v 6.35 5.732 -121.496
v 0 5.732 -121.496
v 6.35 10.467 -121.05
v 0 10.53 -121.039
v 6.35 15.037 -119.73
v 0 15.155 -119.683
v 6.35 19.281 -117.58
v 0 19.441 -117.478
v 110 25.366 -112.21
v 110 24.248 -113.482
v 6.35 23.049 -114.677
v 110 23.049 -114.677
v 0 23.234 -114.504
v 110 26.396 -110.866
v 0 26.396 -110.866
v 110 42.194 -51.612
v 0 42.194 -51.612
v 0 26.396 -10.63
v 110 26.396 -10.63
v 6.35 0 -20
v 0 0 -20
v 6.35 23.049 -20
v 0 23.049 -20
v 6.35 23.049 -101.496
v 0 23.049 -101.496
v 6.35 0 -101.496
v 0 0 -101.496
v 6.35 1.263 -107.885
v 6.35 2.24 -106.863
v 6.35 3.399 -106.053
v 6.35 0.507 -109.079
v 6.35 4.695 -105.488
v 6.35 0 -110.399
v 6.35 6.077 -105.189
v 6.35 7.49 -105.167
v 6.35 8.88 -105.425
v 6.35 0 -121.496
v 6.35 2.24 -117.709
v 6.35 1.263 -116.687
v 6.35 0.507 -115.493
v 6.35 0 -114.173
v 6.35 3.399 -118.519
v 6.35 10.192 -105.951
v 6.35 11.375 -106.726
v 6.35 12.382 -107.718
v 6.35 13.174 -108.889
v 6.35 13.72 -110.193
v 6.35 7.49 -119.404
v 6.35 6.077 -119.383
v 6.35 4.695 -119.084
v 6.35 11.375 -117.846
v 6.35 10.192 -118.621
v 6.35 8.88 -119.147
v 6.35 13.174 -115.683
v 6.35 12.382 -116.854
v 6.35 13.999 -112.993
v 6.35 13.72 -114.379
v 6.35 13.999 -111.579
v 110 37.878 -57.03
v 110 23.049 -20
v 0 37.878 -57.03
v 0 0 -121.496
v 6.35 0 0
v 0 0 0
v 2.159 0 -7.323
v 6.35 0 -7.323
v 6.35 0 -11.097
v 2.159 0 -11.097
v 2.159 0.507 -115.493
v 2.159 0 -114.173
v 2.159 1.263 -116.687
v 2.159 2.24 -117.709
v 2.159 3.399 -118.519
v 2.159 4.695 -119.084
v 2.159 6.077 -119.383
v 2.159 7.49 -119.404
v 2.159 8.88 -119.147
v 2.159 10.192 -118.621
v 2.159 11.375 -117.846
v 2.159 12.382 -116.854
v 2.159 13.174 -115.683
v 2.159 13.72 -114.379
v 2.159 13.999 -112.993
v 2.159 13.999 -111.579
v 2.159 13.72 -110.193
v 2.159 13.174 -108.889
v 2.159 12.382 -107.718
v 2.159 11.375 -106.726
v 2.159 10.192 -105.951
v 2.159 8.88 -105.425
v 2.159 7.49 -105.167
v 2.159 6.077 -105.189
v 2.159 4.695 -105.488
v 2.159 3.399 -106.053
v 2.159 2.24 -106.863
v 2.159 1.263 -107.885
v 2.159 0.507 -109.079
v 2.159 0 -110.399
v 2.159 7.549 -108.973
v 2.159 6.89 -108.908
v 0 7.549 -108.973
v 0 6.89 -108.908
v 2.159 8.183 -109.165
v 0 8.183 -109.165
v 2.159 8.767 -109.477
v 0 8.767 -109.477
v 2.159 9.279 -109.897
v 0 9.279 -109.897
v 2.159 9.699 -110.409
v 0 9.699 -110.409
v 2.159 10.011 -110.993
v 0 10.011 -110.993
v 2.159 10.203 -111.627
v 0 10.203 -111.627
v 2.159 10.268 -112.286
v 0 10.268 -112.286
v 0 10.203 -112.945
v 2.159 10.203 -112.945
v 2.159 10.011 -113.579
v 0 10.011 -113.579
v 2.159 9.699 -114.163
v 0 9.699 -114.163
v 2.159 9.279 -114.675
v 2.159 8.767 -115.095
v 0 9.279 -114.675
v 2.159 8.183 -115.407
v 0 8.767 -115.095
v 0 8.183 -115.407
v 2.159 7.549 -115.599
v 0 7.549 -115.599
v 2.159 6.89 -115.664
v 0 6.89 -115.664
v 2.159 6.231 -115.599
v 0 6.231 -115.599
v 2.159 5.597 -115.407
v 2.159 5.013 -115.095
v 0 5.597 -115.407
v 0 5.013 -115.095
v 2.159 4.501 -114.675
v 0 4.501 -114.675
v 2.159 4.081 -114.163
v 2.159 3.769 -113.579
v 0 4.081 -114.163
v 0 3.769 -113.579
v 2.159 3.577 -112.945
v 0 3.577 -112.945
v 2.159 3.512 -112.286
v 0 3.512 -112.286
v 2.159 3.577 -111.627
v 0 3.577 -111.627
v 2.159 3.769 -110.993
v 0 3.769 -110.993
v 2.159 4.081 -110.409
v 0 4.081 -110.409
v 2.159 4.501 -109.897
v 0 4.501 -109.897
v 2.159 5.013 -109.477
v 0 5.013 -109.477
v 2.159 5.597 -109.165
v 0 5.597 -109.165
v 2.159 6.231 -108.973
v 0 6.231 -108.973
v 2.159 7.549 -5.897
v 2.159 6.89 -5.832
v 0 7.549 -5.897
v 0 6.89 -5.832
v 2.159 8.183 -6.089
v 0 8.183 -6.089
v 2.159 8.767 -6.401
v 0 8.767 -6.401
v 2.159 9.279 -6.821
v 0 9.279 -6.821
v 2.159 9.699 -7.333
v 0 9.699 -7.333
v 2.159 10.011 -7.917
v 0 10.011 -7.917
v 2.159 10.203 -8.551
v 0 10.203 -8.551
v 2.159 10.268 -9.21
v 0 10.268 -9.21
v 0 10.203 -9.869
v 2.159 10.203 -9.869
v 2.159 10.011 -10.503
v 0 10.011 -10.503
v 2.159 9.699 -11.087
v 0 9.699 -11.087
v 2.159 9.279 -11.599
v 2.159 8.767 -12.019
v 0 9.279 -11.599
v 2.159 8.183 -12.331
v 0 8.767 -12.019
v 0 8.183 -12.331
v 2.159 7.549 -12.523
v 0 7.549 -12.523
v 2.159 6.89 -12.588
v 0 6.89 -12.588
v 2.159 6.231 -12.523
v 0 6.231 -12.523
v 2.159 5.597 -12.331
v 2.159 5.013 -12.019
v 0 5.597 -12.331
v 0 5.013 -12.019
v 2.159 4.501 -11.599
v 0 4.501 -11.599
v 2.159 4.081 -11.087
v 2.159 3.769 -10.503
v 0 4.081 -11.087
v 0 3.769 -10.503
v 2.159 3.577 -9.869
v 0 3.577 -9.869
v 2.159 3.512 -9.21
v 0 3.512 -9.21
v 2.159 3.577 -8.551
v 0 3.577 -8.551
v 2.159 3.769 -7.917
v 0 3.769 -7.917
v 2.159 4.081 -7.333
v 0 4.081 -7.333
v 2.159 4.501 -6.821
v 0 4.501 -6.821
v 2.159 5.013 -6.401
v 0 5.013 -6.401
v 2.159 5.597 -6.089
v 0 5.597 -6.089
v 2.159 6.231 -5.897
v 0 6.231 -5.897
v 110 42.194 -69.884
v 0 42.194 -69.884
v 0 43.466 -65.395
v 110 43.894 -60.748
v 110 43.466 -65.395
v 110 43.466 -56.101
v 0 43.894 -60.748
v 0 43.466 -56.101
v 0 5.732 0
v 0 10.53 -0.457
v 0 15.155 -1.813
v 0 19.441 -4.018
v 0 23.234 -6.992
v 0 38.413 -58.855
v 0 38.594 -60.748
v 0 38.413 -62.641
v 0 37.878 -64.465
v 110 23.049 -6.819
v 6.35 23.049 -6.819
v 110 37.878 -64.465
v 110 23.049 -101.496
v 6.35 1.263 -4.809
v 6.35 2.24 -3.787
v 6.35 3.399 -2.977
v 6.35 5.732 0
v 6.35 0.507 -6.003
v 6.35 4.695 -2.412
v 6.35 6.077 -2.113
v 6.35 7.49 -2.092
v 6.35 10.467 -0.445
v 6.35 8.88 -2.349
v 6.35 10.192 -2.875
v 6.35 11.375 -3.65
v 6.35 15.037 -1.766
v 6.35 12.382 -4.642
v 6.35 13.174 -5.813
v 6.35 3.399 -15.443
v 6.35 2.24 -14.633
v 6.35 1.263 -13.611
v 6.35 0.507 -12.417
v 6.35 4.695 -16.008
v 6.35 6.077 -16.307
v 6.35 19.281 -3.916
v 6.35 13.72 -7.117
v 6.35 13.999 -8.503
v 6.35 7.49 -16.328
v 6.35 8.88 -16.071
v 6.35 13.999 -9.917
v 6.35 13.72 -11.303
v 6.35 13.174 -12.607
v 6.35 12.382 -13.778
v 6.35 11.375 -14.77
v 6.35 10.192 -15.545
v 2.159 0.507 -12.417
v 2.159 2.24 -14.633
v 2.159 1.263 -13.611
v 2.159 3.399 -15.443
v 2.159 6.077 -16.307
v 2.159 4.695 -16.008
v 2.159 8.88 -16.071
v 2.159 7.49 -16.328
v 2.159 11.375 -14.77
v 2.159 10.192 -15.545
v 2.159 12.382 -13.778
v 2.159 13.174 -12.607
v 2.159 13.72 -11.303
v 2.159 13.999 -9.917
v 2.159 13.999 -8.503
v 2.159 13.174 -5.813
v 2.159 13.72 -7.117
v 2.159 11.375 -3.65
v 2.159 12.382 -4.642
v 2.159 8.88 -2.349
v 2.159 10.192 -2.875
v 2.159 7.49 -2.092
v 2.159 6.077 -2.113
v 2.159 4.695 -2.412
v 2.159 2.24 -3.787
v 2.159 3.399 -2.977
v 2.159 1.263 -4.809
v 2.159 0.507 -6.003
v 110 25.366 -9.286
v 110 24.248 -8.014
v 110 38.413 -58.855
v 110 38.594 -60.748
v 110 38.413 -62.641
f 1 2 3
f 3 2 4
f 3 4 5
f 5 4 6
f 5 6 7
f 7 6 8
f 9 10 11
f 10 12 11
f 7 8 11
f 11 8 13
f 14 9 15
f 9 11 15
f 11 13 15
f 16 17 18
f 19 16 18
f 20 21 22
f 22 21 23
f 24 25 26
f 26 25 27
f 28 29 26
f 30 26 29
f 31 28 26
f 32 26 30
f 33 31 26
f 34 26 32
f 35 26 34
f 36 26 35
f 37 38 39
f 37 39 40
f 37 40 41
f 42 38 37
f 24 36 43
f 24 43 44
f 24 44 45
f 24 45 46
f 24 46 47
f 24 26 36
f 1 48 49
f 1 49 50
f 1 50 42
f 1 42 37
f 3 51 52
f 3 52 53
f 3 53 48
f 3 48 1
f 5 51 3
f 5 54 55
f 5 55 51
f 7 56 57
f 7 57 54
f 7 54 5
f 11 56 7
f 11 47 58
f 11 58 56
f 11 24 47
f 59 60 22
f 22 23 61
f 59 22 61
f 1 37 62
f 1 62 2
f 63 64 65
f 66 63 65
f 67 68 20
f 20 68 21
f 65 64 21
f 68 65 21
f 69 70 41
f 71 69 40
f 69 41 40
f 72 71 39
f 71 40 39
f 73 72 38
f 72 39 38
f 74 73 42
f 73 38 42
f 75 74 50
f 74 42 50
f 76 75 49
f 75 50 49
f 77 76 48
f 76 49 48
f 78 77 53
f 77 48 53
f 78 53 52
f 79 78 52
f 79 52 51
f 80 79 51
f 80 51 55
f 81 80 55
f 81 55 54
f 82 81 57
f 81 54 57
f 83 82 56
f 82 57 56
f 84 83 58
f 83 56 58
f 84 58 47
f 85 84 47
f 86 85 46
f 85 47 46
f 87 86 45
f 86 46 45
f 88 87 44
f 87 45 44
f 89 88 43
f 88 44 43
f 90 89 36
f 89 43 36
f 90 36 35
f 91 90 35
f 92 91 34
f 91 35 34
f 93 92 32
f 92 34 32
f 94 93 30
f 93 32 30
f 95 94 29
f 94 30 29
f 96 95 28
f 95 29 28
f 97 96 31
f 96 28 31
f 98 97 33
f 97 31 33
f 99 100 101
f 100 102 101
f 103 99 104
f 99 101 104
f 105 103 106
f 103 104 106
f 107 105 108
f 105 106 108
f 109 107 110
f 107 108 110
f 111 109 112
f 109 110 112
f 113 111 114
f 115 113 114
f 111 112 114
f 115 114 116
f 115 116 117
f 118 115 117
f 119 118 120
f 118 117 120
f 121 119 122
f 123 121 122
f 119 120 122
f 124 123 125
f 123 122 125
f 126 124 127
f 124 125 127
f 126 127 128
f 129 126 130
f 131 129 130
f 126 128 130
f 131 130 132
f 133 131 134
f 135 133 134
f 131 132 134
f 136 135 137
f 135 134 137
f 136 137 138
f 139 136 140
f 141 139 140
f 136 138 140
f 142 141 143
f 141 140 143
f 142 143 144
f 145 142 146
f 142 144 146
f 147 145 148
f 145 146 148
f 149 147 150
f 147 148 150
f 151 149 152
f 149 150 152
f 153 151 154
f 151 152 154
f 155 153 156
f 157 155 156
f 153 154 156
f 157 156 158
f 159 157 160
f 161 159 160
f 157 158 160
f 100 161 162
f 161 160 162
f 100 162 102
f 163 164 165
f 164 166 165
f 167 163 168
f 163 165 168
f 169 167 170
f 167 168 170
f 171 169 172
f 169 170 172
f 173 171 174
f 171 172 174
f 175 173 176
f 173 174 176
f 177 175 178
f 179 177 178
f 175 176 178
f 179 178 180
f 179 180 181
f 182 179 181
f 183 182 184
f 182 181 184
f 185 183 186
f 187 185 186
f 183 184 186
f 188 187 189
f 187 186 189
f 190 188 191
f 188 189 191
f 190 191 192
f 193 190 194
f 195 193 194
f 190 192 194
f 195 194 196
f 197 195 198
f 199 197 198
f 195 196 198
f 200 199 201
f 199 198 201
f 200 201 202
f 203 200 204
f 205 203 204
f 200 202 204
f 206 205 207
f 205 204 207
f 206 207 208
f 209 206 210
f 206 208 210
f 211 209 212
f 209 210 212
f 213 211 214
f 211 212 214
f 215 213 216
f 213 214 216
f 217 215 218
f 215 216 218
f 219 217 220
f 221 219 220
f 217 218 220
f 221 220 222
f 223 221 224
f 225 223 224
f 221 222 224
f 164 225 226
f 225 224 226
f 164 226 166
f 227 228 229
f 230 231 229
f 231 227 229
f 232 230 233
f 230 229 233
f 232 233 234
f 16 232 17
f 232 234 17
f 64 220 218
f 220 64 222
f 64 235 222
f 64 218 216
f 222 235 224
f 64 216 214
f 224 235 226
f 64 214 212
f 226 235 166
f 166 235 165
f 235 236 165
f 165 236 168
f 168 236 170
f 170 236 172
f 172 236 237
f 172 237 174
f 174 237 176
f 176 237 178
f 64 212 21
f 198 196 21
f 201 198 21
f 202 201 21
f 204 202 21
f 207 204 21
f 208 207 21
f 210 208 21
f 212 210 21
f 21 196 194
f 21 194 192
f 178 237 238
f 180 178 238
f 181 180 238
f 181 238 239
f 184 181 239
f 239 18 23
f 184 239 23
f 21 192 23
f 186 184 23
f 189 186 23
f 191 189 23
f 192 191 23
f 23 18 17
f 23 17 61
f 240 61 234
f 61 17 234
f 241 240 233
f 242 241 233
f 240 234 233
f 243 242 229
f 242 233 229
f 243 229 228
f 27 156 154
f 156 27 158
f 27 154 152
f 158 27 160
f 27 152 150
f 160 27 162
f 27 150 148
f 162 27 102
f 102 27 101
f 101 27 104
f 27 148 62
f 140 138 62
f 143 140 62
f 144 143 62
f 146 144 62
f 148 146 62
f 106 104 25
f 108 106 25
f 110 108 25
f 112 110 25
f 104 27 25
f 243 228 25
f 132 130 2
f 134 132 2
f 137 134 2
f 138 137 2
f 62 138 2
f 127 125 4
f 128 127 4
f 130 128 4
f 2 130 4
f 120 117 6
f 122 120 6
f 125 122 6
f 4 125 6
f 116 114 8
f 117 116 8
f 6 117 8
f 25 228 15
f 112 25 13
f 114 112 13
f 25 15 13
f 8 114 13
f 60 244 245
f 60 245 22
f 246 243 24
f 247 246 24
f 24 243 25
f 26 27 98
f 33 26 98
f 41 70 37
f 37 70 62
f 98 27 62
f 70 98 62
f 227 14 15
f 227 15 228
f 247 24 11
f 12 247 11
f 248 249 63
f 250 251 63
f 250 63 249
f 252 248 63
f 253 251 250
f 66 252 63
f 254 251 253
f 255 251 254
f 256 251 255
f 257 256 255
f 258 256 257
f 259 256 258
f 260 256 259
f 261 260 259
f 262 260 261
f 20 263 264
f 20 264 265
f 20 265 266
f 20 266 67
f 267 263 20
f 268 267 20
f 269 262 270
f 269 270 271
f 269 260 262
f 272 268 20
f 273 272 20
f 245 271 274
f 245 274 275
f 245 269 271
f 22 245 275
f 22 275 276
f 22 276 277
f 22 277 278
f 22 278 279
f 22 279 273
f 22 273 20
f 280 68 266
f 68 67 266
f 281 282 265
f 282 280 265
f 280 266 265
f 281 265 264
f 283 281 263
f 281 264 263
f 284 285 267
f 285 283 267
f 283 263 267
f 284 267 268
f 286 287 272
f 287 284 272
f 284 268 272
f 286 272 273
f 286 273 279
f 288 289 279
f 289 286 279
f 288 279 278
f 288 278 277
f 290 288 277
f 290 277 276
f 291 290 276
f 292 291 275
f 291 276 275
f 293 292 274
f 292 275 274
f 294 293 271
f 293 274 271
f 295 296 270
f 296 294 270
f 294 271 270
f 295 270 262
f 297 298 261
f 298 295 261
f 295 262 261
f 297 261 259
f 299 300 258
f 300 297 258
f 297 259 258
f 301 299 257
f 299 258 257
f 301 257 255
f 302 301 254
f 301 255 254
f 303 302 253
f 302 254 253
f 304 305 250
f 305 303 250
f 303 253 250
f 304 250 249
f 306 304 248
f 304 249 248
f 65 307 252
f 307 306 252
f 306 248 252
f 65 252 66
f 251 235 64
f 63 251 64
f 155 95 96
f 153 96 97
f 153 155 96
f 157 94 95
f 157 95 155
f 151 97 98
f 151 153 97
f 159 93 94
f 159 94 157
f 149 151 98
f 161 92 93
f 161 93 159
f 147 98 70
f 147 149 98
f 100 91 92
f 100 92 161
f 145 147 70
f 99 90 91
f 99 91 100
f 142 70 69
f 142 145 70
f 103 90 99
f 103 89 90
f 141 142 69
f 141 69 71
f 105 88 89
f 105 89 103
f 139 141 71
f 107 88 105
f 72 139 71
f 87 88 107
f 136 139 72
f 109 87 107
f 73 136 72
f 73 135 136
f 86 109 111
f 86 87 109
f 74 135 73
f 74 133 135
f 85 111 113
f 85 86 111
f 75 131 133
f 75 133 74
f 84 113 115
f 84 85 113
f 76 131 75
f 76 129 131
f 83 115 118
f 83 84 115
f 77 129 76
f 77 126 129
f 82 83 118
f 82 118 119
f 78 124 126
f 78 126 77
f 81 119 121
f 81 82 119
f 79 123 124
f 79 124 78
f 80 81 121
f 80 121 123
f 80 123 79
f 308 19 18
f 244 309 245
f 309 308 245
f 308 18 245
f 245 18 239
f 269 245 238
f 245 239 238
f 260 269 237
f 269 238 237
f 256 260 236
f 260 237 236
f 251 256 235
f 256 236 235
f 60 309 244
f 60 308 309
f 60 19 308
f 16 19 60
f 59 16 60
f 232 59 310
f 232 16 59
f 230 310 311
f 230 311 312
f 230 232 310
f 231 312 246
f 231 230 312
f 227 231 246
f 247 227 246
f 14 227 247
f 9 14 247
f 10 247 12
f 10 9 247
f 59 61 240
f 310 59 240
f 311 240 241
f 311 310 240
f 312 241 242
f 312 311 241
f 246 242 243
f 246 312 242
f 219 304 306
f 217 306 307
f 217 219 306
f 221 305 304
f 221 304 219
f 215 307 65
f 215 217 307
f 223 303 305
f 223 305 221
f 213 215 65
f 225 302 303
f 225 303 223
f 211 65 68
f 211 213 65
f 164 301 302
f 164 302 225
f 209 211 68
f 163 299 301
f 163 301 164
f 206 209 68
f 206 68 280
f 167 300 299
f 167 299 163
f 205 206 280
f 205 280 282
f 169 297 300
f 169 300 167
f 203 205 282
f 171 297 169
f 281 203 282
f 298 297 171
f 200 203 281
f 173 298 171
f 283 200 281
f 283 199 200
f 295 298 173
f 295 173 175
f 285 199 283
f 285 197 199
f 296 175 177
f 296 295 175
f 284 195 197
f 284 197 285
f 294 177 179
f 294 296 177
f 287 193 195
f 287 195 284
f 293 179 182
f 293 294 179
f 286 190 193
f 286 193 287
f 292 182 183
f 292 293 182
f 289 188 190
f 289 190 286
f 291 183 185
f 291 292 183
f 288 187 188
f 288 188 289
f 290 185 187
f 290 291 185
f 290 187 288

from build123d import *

# Parameters (mm, degrees)
BOSS_EXTRUDE1_DEPTH                                  = 110
FILLET1_R                                            = 25.4
FILLET2_R                                            = 10
SKETCH2_W                                            = 20
SKETCH2_H                                            = 23.04885876
CUT_EXTRUDE1_DEPTH                                   = 103.65
CBORE_FOR_1_4_BINDING_HEAD_MACHINE_SCREW_D           = 6.7564
CBORE_FOR_1_4_BINDING_HEAD_MACHINE_SCREW_CBORE_D     = 14.2875
CBORE_FOR_1_4_BINDING_HEAD_MACHINE_SCREW_CBORE_DEPTH = 4.191


with BuildPart() as part:
    # Sketch1 → Boss-Extrude1 (new body)
    with BuildSketch(Plane(origin=(0, 0, 0), x_dir=(0, 0, -1), z_dir=(1, 0, 0))):
        Polygon((0, 0), (20, 0), (20, 23.04885876), (60.747951032, 39.36618781), (101.495902064, 23.04885876), (101.495902064, 0), (121.495902064, 0), (121.495902064, 26.395679347), (110.865902064, 26.395679347), (60.747951032, 45.71618781), (10.63, 26.395679347), (0, 26.395679347), align=None)
    extrude(amount=BOSS_EXTRUDE1_DEPTH)

    # Fillet1
    # the kernel refuses this fillet: 25.4 mm, written as the material it takes off along each edge
    with BuildSketch(Plane(origin=(-51.660375289, 26.395679347, -121.495902064), x_dir=(0, -1, 0), z_dir=(1, 0, 0))) as fillet1_piece_1:
        with BuildLine():
            CenterArc((20.664150116, -25.4), FILLET1_R, 90, 54.444163321)
            Line((0, -10.63), (-0.413283002, -10.3346))
            ThreePointArc((-0.413283002, -10.3346), (-0.508, -5.315), (-0.508, 0))
            Line((-0.508, 0), (0, 0.508))
            Line((0, 0.508), (20.664150116, 0.508))
            Line((20.664150116, 0.508), (20.664150116, 0))
        make_face()
    extrude(amount=213.320750578, mode=Mode.SUBTRACT)
    with BuildSketch(Plane(origin=(-51.660375289, 26.395679347, 0), x_dir=(0, 0, -1), z_dir=(1, 0, 0))) as fillet1_piece_2:
        with BuildLine():
            CenterArc((25.4, -20.664150116), FILLET1_R, 125.555836679, 54.444163321)
            Line((0, -20.664150116), (-0.508, -20.664150116))
            Line((-0.508, -20.664150116), (-0.508, 0))
            Line((-0.508, 0), (0, 0.508))
            ThreePointArc((0, 0.508), (5.315, 0.508), (10.3346, 0.413283002))
            Line((10.3346, 0.413283002), (10.63, 0))
        make_face()
    extrude(amount=213.320750578, mode=Mode.SUBTRACT)
    with BuildSketch(Plane(origin=(-24.479298578, 45.71618781, -60.747951032), x_dir=(0, -0.35969863434758087, -0.9330685357724187), z_dir=(1, 0, 0))) as fillet1_piece_3:
        with BuildLine():
            CenterArc((FILLET1_R * 0.385500765011, -FILLET1_R), FILLET1_R, 90, 42.163378571)
            Line((-FILLET1_R * 0.285746191129, -FILLET1_R * 0.258766215103), (-FILLET1_R * 0.299171130252, -FILLET1_R * 0.243941539405))
            Line((-FILLET1_R * 0.299171130252, -FILLET1_R * 0.243941539405), (-FILLET1_R * 0.00771001530021, FILLET1_R * 0.02))
            Line((-FILLET1_R * 0.00771001530021, FILLET1_R * 0.02), (FILLET1_R * 0.385500765011, FILLET1_R * 0.02))
            Line((FILLET1_R * 0.385500765011, FILLET1_R * 0.02), (FILLET1_R * 0.385500765011, 0))
        make_face()
    extrude(amount=158.958597156, mode=Mode.SUBTRACT)

    # Fillet2
    fillet2_edges = [part.edges().sort_by_distance(p)[0] for p in [
        (55, 39.36618781, -60.747951032),
    ]]
    fillet(fillet2_edges, radius=FILLET2_R)

    # Sketch2 → Cut-Extrude1 (cut)
    with BuildSketch(Plane(origin=(110, 0, 0), x_dir=(0, 0, -1), z_dir=(1, 0, 0))):
        with Locations((10, 11.52442938)):
            Rectangle(SKETCH2_W, SKETCH2_H)
        with Locations((111.495902064, 11.52442938)):
            Rectangle(SKETCH2_W, SKETCH2_H)
    extrude(amount=-CUT_EXTRUDE1_DEPTH, mode=Mode.SUBTRACT)

    # CBORE for 1/4 Binding Head Machine Screw1 (through all)
    with Locations(Plane(origin=(6.35, 0, 0), x_dir=(0, 0, -1), z_dir=(1, 0, 0))):
        with Locations((9.21, 6.89), (112.285902064, 6.89)):
            CounterBoreHole(CBORE_FOR_1_4_BINDING_HEAD_MACHINE_SCREW_D / 2, CBORE_FOR_1_4_BINDING_HEAD_MACHINE_SCREW_CBORE_D / 2, CBORE_FOR_1_4_BINDING_HEAD_MACHINE_SCREW_CBORE_DEPTH)


solid = part.part
